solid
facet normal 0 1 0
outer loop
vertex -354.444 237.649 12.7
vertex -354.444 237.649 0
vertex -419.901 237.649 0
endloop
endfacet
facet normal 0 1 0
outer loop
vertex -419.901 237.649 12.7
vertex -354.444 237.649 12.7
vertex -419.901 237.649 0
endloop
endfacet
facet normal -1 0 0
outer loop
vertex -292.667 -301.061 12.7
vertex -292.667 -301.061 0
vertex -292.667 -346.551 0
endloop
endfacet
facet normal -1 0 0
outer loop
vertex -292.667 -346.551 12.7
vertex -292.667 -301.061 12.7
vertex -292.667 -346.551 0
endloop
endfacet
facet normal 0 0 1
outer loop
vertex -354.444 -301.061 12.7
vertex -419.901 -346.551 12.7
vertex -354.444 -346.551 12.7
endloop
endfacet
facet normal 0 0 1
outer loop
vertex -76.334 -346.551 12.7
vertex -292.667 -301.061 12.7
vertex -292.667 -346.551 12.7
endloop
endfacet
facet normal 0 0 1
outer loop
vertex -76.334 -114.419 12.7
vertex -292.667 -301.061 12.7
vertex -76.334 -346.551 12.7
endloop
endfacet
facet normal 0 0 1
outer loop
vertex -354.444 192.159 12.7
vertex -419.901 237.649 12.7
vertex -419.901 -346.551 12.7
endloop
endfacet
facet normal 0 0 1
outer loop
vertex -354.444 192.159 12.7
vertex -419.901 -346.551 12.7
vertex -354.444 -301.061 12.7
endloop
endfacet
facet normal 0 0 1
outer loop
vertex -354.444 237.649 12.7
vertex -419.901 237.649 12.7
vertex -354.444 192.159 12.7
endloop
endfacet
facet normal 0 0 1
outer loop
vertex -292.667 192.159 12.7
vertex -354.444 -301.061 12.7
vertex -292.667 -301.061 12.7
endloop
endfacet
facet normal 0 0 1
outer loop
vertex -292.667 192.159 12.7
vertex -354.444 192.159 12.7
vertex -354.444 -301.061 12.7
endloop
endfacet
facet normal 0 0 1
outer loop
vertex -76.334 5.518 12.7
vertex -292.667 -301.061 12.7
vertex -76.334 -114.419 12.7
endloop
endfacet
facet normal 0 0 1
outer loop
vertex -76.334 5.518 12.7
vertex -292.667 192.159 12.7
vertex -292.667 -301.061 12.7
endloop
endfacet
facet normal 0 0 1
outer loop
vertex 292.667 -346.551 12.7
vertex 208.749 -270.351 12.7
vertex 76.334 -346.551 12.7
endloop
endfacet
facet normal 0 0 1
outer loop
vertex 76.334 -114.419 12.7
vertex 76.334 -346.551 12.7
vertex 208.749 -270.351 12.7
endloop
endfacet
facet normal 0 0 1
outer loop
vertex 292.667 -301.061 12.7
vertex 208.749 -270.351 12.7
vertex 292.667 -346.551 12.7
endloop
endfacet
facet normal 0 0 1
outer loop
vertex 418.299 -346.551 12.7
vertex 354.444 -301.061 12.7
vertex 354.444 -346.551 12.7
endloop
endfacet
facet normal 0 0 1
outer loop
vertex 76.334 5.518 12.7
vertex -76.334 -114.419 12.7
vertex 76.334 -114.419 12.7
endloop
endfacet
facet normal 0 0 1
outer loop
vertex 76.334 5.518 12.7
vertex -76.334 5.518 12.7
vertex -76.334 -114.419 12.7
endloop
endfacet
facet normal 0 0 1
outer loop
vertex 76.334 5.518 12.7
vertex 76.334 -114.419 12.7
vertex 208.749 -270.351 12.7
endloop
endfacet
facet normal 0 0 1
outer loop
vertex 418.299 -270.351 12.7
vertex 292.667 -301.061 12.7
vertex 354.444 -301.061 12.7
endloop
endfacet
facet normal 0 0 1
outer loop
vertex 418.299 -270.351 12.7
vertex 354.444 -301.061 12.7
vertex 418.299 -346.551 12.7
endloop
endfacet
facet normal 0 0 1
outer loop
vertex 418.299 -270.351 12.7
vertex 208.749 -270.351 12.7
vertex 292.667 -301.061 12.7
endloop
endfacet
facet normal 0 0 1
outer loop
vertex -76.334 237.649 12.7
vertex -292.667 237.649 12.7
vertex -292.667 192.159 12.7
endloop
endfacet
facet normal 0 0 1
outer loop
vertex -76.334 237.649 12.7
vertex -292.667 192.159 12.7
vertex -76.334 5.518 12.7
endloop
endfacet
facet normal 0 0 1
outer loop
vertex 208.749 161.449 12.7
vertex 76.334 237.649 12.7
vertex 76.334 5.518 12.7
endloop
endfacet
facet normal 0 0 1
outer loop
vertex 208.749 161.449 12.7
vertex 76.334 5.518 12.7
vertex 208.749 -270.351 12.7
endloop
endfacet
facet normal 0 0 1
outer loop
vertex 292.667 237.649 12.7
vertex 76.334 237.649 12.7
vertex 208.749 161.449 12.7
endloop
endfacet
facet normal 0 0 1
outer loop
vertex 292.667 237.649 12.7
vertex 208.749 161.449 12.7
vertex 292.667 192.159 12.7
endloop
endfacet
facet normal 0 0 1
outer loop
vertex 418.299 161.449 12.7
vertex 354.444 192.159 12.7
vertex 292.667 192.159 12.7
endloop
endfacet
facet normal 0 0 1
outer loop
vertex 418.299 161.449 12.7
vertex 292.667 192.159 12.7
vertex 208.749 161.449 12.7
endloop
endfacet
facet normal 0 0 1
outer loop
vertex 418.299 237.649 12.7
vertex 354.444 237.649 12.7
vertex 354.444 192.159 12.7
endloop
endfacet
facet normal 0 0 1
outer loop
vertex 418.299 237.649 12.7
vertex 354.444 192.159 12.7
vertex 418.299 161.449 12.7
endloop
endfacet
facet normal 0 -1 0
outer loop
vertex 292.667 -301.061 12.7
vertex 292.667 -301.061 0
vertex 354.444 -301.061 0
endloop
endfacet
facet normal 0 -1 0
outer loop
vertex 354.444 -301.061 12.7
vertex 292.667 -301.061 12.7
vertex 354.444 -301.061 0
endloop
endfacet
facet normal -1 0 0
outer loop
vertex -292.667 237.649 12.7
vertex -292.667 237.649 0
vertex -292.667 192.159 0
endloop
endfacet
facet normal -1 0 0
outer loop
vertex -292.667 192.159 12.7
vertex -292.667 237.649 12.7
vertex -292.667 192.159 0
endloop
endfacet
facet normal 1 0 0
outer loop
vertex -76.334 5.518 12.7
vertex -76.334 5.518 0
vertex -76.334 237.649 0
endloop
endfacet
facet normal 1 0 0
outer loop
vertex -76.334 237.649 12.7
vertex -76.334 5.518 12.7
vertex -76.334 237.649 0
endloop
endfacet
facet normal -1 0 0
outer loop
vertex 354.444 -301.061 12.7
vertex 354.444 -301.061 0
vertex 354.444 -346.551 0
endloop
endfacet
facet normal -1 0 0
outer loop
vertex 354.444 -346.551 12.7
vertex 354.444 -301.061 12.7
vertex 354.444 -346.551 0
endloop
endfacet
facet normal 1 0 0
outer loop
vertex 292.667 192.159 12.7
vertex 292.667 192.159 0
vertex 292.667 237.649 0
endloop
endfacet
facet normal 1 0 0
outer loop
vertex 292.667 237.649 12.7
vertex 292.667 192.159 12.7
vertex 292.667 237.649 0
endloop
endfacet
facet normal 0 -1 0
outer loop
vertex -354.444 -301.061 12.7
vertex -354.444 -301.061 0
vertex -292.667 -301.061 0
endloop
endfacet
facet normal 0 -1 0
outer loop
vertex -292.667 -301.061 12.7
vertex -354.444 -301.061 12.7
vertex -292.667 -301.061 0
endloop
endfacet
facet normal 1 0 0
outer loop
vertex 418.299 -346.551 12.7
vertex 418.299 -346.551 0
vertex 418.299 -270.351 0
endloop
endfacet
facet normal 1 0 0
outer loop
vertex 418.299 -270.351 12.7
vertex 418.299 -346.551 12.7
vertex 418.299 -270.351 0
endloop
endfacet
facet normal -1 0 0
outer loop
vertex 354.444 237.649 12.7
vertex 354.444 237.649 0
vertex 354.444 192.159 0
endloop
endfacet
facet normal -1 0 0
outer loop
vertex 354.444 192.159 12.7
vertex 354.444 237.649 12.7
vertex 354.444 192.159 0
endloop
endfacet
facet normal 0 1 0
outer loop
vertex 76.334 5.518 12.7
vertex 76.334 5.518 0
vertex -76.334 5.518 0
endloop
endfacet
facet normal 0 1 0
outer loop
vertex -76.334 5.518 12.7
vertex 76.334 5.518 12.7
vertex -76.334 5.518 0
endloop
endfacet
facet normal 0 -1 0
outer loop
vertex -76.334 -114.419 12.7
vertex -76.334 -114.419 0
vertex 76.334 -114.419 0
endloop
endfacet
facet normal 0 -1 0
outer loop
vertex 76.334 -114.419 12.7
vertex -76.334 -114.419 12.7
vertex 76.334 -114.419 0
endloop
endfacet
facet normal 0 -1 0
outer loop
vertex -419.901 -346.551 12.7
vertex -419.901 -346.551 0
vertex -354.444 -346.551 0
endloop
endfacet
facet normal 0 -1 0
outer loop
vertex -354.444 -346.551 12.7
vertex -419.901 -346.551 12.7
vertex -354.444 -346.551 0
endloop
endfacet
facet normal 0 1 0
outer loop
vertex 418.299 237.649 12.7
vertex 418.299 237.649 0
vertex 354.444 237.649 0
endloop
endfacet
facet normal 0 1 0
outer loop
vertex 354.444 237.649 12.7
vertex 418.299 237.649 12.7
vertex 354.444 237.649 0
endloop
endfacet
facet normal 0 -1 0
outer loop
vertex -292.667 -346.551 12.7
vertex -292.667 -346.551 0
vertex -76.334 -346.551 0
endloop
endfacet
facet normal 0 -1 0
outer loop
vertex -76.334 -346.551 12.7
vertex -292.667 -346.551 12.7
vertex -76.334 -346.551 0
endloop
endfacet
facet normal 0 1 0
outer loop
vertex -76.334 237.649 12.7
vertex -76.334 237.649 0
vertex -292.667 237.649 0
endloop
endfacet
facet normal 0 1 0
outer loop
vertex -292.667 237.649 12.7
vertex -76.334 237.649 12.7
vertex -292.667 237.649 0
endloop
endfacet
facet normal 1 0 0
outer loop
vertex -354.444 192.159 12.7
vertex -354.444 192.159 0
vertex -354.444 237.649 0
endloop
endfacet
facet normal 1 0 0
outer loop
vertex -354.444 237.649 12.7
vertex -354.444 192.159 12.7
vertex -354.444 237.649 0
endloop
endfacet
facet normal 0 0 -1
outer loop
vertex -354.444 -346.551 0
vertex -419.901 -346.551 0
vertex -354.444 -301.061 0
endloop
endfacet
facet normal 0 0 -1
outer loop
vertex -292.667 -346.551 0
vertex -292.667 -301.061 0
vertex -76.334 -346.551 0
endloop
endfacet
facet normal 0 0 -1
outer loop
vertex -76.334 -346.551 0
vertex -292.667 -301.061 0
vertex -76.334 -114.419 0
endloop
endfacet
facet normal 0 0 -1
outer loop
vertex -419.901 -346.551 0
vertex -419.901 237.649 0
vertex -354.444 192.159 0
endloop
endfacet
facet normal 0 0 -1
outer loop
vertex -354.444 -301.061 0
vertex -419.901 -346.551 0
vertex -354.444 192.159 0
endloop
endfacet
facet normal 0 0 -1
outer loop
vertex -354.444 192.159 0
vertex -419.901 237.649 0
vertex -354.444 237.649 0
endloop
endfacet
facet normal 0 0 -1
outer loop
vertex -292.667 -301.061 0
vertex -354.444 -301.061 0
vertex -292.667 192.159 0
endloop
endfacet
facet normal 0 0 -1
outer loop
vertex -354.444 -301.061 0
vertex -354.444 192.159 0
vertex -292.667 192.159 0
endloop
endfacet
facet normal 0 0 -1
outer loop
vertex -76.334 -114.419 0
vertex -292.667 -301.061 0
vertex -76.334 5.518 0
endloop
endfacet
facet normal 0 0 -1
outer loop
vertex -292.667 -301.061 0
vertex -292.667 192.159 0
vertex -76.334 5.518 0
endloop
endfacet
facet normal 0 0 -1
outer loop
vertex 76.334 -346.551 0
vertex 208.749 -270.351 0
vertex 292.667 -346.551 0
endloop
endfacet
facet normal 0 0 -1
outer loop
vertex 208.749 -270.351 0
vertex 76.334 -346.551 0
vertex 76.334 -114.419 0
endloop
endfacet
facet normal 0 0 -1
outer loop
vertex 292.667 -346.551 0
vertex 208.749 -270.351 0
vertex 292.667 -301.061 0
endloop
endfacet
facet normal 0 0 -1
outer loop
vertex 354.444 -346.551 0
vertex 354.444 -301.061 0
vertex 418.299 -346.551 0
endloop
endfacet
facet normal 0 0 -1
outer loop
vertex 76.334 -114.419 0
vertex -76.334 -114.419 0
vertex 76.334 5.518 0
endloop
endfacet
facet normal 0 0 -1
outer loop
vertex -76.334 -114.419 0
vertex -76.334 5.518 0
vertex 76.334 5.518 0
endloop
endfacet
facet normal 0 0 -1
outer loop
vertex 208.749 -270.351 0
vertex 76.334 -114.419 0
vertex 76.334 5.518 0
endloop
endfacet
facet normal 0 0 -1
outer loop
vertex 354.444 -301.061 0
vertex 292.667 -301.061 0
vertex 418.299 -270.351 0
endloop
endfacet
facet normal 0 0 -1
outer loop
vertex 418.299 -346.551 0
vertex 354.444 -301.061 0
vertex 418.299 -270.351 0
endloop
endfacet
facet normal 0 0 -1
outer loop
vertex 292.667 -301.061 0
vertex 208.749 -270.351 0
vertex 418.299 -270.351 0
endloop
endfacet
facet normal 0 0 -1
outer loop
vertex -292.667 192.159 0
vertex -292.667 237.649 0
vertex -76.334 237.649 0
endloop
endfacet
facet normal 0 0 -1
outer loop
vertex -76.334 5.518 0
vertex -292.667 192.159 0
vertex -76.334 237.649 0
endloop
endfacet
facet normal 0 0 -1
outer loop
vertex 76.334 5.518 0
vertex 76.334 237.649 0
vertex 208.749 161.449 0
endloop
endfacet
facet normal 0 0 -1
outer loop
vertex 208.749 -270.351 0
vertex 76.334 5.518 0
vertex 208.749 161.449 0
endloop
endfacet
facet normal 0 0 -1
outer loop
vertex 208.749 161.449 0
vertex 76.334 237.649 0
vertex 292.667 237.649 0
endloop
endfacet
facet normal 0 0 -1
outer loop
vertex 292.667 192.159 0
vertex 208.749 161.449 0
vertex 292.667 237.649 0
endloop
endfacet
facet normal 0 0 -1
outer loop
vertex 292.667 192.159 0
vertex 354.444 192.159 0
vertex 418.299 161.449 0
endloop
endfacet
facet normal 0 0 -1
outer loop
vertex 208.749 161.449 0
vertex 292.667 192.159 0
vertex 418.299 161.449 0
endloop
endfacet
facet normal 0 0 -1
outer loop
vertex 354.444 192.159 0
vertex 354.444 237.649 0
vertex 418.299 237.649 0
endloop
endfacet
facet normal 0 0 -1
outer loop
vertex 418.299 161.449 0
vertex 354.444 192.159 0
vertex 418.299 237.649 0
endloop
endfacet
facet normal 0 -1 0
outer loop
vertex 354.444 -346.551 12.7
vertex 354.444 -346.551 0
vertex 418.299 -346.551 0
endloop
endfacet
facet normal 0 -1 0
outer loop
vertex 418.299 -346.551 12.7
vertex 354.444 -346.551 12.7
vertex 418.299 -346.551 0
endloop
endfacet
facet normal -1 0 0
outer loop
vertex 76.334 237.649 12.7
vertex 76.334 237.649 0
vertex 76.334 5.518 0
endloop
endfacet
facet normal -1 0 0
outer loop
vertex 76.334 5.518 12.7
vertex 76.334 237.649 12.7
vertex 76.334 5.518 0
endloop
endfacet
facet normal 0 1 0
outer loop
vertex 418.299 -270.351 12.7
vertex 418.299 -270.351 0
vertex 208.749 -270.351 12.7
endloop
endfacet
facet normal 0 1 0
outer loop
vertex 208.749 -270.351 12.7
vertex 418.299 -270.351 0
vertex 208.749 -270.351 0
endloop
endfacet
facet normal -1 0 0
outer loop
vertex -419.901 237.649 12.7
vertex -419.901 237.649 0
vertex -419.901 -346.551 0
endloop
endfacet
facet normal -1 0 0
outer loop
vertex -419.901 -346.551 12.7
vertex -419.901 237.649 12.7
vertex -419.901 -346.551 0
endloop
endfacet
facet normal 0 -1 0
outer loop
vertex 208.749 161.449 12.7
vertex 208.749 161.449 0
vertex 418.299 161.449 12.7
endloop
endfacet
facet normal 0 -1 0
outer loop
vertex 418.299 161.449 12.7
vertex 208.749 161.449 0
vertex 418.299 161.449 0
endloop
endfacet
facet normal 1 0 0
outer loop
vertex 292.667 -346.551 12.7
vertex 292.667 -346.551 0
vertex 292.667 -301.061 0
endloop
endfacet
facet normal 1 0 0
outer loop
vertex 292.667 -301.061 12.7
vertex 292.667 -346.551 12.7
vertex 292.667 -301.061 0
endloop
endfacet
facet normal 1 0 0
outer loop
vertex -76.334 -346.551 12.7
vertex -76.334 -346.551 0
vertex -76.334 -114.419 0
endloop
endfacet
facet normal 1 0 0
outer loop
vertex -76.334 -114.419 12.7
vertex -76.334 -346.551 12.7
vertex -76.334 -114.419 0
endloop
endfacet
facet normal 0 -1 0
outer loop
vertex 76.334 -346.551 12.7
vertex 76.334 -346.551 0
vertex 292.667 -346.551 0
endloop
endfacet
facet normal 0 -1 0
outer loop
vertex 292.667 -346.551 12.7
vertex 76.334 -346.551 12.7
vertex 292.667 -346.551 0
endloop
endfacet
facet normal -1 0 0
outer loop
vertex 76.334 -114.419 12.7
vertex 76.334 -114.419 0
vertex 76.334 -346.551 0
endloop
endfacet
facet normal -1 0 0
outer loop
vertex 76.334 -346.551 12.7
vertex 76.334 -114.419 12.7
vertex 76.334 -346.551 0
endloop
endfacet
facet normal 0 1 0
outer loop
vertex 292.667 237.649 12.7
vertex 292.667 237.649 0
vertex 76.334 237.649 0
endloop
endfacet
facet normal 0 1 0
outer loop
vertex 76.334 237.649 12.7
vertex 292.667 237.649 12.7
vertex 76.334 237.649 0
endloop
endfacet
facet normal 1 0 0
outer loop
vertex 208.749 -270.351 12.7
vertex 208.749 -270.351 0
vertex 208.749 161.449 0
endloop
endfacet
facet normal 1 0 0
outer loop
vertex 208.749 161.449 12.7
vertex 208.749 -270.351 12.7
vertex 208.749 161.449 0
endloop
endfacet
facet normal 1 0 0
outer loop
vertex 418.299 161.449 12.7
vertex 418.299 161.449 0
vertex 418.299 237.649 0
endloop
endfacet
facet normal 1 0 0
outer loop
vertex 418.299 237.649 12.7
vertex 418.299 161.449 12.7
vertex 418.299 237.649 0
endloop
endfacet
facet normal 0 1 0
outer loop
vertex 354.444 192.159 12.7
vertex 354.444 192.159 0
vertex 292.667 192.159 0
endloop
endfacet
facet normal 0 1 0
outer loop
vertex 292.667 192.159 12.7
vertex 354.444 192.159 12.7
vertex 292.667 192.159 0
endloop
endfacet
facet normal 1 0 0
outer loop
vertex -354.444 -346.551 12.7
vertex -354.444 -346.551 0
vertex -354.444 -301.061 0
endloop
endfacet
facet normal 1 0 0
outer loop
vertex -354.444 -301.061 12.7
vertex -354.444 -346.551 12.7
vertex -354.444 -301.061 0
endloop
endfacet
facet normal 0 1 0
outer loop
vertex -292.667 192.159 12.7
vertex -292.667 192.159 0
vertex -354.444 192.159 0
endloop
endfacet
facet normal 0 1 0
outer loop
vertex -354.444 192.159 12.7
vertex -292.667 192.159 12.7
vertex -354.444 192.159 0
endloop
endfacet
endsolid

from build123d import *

# Parameters (mm, degrees)
F1_DEPTH = 12.7


with BuildPart() as f1:
    # F0 (on Top) → F1 (new body)
    with BuildSketch(Plane.XY):
        Polygon((-418.2990551353, 237.649252063), (-419.9009448647, 237.649252063), (-419.9009448647, -346.550747937), (-354.444026947, -346.550747937), (-354.444026947, -301.0607462526), (-292.6674187183, -301.0607462526), (-292.6674187183, -346.550747937), (-76.3335824013, -346.550747937), (-76.3335824013, -114.4193708897), (76.3335824013, -114.4193708897), (76.3335824013, -346.550747937), (292.6674187183, -346.550747937), (292.6674187183, -301.0607462526), (354.444026947, -301.0607462526), (354.444026947, -346.550747937), (418.2990551353, -346.550747937), (418.2990551353, -270.350747937), (208.7490551353, -270.350747937), (208.7490551353, 161.449252063), (418.2990551353, 161.449252063), (418.2990551353, 237.649252063), (354.444026947, 237.649252063), (354.444026947, 192.1592503786), (292.6674187183, 192.1592503786), (292.6674187183, 237.649252063), (76.3335824013, 237.649252063), (76.3335824013, 5.5178750157), (-76.3335824013, 5.5178750157), (-76.3335824013, 237.649252063), (-292.6674187183, 237.649252063), (-292.6674187183, 192.1592503786), (-354.444026947, 192.1592503786), (-354.444026947, 237.649252063), align=None)
    extrude(amount=F1_DEPTH)


solid = f1.part
